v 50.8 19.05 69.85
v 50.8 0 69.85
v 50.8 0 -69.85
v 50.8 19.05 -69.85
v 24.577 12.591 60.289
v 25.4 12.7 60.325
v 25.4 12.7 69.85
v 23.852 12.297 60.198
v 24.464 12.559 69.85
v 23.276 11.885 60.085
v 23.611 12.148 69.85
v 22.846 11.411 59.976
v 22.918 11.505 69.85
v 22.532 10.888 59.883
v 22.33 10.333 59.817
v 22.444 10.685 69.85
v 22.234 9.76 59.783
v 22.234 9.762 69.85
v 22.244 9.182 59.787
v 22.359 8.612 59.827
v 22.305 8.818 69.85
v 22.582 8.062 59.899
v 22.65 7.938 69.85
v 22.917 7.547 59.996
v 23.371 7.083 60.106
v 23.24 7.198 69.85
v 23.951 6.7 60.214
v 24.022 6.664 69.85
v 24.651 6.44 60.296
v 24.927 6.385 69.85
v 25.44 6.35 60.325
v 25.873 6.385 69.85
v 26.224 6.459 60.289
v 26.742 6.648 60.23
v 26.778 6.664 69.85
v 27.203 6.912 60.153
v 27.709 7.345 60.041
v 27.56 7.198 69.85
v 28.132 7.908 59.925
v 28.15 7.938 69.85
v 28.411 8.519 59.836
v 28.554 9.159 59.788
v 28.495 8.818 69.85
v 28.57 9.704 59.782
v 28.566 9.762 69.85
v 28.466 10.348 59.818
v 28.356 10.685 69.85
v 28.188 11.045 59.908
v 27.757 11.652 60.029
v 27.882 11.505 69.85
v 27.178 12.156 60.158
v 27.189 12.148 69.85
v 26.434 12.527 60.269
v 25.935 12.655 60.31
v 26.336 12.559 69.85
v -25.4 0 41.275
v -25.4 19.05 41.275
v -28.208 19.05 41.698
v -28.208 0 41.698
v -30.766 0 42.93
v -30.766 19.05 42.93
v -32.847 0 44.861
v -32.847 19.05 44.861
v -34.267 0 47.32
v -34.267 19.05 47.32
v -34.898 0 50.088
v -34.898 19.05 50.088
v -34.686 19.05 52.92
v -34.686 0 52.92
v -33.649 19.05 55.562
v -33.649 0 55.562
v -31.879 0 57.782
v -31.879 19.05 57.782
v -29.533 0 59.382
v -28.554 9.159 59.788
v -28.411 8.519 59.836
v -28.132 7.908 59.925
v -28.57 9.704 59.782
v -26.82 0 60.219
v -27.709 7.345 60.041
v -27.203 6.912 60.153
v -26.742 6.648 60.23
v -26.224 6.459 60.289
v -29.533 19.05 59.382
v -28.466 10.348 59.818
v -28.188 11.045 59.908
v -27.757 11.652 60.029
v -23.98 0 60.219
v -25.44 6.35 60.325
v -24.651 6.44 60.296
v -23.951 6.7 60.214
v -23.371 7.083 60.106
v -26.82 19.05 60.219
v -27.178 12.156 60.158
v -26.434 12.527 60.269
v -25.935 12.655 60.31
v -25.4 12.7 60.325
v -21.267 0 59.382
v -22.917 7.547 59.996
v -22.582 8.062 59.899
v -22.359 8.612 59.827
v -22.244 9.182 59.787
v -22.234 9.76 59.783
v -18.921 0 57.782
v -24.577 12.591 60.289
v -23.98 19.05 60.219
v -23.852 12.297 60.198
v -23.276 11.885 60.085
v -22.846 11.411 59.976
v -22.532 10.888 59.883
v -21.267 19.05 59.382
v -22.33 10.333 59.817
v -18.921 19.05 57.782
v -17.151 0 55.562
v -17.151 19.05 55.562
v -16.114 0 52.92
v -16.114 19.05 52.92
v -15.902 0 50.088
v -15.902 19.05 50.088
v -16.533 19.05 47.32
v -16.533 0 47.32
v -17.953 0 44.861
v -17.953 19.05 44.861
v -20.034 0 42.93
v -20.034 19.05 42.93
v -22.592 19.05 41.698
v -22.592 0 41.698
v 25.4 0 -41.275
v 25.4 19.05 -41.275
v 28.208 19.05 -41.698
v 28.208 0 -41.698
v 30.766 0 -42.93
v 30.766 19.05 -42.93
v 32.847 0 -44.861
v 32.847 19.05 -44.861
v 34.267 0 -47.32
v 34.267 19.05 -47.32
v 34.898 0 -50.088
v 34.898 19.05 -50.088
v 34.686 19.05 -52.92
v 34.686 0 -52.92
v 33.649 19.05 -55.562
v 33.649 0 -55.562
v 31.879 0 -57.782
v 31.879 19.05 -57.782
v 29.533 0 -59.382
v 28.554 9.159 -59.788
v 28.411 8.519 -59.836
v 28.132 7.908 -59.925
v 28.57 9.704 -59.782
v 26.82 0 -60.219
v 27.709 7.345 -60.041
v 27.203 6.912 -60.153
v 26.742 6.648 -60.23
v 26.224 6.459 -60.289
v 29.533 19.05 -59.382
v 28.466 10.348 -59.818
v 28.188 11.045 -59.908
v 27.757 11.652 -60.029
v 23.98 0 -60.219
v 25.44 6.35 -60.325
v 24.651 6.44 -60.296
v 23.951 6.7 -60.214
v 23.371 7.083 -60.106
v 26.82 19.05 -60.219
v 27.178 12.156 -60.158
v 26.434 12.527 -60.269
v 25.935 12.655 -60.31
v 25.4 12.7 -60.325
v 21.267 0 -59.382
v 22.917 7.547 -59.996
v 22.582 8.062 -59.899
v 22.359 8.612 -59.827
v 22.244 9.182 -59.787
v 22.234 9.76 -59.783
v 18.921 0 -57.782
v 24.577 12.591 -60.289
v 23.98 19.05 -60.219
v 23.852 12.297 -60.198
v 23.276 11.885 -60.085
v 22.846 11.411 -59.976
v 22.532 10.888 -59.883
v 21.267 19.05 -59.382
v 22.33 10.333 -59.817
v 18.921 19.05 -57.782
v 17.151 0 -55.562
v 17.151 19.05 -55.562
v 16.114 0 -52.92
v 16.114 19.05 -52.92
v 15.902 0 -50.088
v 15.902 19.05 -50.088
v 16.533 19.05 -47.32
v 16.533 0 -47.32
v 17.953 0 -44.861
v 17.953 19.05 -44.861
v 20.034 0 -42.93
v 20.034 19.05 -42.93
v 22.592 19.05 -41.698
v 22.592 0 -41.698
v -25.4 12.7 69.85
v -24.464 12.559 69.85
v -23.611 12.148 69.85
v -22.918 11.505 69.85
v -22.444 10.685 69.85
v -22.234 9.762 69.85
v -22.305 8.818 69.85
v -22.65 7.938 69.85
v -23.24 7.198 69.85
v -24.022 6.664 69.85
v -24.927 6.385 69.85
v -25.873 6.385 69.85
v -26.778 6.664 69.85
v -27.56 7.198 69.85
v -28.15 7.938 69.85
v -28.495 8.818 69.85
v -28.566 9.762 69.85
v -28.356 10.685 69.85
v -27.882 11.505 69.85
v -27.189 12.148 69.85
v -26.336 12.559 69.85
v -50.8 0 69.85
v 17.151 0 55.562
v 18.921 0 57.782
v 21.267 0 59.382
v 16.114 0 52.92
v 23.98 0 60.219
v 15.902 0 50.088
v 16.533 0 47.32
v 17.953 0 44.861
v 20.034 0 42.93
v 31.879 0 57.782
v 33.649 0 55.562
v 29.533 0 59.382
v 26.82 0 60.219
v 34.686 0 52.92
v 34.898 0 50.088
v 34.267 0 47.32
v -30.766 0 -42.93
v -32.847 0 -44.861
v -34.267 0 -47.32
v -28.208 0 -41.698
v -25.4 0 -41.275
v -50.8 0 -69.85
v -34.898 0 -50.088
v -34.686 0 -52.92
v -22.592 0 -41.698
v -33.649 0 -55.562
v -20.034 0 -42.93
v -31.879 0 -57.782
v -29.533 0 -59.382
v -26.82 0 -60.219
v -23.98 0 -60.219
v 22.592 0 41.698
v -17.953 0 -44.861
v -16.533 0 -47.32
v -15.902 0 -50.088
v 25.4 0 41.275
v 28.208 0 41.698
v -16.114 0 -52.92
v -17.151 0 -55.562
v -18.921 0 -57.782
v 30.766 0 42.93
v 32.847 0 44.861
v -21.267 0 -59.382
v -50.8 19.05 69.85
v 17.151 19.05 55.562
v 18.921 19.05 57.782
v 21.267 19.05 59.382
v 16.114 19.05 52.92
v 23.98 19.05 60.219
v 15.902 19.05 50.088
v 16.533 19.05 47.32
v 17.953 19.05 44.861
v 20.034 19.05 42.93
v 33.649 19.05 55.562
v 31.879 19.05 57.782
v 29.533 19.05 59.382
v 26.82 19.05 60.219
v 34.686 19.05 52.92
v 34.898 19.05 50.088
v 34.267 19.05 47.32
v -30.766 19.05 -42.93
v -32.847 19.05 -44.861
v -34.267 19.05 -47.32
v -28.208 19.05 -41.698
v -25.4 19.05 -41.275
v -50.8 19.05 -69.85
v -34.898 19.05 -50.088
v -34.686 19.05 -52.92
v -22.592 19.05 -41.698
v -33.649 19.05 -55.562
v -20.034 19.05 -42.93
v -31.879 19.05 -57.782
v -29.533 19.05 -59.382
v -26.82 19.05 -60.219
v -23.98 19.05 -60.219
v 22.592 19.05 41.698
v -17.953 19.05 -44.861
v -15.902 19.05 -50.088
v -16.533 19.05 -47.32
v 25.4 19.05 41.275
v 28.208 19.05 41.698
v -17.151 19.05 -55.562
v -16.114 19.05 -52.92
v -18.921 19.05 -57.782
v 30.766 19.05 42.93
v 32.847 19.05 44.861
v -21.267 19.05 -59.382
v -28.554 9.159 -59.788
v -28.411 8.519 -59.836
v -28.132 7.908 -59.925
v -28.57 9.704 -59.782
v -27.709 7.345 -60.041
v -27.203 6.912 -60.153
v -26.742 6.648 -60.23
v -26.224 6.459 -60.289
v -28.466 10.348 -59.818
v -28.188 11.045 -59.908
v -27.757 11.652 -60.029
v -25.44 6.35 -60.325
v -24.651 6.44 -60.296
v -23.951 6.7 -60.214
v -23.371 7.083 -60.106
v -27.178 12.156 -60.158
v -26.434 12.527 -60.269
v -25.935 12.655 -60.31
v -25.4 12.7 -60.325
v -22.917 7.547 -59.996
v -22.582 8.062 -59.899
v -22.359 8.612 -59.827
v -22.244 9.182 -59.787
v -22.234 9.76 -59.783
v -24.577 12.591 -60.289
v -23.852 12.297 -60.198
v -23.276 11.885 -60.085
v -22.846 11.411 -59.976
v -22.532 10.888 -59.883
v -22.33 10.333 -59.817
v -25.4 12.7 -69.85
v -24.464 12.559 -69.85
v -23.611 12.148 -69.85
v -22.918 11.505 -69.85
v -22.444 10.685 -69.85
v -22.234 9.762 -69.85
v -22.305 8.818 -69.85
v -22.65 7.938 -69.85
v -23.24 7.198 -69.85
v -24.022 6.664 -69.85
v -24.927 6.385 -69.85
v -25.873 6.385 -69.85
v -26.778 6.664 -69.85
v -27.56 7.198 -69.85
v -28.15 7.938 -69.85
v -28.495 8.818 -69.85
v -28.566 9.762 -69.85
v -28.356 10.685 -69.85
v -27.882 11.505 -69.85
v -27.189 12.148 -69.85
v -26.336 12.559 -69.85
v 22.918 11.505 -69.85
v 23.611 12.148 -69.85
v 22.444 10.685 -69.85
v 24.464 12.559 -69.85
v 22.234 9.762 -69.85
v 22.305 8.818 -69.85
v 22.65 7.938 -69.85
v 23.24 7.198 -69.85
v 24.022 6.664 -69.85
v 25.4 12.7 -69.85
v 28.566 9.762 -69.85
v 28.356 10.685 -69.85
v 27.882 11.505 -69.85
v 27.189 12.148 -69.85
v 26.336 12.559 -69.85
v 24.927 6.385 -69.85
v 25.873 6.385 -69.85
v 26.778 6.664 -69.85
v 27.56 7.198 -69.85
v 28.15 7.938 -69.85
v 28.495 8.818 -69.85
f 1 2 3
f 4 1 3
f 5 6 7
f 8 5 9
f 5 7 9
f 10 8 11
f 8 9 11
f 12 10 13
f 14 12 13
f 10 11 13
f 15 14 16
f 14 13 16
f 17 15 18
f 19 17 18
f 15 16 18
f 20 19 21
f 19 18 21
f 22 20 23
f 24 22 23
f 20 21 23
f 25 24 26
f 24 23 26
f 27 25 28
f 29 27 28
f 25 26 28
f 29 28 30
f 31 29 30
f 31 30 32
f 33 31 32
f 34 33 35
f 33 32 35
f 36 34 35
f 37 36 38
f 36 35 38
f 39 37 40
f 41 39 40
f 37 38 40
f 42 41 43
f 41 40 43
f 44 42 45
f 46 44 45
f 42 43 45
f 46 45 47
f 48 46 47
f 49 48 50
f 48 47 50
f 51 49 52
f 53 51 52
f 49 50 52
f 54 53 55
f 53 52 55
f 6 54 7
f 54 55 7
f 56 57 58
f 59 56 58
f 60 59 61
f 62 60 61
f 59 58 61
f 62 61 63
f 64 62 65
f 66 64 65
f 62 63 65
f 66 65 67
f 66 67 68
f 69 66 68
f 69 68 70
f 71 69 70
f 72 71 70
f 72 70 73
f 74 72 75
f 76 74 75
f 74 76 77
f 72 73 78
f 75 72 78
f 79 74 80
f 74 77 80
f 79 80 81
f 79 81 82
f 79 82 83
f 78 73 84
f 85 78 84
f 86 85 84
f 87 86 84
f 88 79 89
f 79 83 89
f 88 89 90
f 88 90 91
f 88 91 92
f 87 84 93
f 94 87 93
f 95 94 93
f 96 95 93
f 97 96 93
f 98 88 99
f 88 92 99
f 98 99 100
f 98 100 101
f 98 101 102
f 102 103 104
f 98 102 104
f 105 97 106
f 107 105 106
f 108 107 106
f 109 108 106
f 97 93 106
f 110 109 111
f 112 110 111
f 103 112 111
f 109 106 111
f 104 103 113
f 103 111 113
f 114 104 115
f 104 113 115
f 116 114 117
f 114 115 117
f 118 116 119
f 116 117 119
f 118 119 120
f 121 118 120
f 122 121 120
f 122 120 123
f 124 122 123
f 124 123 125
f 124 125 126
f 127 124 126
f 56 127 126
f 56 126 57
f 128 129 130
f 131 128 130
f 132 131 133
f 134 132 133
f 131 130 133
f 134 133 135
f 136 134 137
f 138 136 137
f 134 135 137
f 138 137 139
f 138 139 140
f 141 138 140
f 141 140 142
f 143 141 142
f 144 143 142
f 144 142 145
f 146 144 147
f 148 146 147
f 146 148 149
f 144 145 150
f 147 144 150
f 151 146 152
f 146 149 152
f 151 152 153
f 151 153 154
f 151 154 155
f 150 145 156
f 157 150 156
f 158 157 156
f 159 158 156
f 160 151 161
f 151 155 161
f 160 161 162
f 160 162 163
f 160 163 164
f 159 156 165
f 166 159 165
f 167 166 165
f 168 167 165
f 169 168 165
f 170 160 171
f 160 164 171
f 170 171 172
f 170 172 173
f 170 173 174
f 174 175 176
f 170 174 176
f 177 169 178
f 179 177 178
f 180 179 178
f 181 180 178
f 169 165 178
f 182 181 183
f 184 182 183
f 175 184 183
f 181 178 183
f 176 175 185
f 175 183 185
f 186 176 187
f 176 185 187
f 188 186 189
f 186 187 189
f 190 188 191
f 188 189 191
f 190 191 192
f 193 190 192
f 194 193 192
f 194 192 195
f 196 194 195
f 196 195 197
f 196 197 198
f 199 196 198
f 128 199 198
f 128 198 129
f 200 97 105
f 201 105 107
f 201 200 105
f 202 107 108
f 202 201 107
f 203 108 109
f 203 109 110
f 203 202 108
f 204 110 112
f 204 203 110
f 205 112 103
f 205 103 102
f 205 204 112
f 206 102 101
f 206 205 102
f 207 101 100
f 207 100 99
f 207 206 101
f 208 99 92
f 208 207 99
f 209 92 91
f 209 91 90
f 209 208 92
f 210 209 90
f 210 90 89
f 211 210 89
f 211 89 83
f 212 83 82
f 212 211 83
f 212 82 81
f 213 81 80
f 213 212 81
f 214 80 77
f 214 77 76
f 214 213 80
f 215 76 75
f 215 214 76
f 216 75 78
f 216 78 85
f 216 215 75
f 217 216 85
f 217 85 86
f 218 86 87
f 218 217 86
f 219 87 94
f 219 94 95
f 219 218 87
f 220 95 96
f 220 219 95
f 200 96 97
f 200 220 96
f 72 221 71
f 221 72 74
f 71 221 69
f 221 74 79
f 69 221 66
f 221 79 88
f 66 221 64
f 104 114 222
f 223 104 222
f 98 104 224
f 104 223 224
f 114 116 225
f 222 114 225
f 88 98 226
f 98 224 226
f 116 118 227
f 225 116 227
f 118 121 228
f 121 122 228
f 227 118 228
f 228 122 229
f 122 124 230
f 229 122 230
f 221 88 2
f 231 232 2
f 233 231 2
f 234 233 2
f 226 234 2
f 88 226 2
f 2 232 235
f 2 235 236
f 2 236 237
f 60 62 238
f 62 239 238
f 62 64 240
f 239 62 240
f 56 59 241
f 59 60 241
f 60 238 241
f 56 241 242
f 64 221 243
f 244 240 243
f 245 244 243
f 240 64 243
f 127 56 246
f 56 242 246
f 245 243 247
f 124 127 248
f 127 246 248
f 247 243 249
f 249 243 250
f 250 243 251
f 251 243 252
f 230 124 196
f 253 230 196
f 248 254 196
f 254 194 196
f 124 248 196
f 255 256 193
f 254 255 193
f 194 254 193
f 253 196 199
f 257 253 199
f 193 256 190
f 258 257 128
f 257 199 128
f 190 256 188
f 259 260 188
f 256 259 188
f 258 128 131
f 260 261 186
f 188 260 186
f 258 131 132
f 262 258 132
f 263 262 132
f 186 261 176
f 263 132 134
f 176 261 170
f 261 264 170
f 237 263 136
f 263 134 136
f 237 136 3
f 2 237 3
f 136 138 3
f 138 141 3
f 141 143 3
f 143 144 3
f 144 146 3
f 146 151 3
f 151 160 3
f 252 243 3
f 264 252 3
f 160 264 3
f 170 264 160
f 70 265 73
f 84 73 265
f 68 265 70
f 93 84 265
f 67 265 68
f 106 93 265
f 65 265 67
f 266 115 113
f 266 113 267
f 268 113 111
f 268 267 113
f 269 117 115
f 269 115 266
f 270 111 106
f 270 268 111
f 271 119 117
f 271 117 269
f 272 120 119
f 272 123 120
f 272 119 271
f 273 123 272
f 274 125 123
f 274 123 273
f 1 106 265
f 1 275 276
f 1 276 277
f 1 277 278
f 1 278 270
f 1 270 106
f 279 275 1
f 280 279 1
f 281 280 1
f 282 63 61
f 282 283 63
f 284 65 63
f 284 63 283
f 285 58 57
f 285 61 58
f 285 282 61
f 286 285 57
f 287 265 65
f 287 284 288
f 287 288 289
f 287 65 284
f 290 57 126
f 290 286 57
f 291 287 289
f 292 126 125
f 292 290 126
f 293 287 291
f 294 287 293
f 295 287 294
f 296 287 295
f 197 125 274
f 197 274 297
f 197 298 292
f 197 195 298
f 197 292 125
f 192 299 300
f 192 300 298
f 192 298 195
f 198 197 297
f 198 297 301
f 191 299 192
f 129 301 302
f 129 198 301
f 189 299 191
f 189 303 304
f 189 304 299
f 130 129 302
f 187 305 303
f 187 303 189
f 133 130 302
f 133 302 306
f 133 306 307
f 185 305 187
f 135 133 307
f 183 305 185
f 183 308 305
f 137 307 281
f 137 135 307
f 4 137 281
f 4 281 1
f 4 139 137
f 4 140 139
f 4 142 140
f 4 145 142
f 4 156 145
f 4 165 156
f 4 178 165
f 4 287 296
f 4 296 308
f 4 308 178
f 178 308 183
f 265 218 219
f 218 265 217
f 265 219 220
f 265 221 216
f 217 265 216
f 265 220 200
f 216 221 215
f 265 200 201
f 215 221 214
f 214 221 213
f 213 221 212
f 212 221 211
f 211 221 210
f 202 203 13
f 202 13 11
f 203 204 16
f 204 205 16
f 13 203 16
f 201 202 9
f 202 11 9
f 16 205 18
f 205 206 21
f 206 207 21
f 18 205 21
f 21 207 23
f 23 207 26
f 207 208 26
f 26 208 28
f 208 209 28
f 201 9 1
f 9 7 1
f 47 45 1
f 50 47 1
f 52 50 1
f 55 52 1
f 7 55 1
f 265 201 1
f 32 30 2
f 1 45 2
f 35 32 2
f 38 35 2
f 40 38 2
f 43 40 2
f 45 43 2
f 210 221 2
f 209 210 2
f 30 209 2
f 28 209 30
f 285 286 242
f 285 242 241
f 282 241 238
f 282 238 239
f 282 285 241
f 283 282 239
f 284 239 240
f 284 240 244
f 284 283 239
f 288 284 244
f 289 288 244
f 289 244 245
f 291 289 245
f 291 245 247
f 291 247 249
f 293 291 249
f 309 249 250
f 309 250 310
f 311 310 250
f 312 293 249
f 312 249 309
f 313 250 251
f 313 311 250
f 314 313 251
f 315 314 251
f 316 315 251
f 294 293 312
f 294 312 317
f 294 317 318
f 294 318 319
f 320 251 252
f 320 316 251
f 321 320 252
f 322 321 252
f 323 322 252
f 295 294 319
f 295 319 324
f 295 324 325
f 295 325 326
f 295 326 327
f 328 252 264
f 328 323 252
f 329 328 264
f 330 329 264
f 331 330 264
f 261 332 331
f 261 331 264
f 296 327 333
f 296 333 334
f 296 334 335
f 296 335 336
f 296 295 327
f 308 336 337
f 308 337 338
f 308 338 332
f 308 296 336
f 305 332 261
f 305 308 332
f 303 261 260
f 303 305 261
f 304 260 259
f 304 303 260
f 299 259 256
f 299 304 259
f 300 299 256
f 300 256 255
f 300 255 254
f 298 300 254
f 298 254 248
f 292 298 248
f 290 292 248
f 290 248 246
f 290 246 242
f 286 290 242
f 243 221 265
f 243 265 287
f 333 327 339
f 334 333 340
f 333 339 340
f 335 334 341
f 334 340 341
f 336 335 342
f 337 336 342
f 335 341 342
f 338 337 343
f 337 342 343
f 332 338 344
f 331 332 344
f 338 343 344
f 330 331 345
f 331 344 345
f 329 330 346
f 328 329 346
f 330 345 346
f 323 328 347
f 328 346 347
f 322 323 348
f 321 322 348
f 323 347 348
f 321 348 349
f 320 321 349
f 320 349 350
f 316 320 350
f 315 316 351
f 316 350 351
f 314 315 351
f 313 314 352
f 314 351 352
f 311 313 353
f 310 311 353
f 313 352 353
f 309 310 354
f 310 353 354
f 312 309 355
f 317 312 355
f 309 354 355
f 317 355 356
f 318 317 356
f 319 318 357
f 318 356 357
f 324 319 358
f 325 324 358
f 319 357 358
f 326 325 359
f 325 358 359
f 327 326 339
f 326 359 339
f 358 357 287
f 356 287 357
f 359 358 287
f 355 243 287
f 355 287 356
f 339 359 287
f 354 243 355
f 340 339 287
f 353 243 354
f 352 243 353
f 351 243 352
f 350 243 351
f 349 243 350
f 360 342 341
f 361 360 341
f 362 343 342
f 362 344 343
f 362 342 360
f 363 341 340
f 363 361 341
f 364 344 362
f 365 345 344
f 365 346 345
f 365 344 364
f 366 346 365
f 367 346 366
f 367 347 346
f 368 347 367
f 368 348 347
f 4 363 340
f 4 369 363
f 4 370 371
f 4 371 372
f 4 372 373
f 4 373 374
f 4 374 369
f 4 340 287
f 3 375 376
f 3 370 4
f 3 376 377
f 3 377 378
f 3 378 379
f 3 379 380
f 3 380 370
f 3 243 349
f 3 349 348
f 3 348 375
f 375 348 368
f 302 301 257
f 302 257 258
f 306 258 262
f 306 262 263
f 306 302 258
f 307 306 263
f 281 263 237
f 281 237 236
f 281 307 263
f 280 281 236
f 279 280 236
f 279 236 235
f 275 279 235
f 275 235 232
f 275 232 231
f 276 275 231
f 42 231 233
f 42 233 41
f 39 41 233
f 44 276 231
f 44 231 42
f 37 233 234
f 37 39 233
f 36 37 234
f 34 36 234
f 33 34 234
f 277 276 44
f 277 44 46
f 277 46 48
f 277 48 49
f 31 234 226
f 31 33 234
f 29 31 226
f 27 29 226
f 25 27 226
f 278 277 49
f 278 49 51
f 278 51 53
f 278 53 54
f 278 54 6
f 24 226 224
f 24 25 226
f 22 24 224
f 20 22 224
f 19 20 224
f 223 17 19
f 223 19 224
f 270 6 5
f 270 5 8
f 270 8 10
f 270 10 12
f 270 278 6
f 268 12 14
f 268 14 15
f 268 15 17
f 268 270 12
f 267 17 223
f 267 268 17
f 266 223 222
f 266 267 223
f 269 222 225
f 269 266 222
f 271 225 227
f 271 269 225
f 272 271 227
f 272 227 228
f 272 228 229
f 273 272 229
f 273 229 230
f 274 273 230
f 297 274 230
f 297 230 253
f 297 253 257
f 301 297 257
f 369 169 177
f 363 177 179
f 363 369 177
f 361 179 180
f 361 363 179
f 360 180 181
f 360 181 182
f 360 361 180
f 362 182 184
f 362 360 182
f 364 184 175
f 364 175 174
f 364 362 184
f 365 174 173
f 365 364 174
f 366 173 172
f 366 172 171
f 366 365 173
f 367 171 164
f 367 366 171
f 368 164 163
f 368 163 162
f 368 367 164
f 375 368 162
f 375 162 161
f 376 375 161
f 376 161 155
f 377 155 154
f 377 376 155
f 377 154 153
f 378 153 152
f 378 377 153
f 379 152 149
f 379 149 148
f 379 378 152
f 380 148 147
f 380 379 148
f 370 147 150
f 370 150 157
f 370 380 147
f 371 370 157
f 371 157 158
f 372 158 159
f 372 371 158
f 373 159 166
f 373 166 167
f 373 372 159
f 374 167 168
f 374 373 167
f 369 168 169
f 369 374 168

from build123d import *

# Parameters (mm, degrees)
SKETCH1_W           = 101.6
SKETCH1_H           = 139.7
BOSS_EXTRUDE1_DEPTH = 19.05


with BuildPart() as part:
    # Sketch1 → Boss-Extrude1 (new body)
    with BuildSketch(Plane(origin=(0, 0, 0), x_dir=(1, 0, 0), z_dir=(0, 1, 0))):
        Rectangle(SKETCH1_W, SKETCH1_H)
    extrude(amount=BOSS_EXTRUDE1_DEPTH)

    # Sketch2 → 3/4 (0.75) Diameter Hole1 (revolve, cut)
    with BuildSketch(Plane(origin=(-25.4, 19.05, -50.8), x_dir=(0, 0, 1), z_dir=(1, 0, 0))):
        Polygon((0, 0), (0, 24.773197396), (9.525, 19.05), (9.525, 0), align=None)
    f_3_4_0_75_diameter_hole1 = revolve(axis=Axis((-25.4, 25.4, -50.8), (0, -1, 0)), mode=Mode.SUBTRACT)

    # Mirror1: 3/4 (0.75) Diameter Hole1 across plane
    add(f_3_4_0_75_diameter_hole1.mirror(Plane.XY), mode=Mode.SUBTRACT)

    # Mirror4: 3/4 (0.75) Diameter Hole1 across plane
    add(f_3_4_0_75_diameter_hole1.mirror(Plane(origin=(0, 0, 0), x_dir=(0, 0, 1), z_dir=(1, 0, 0))), mode=Mode.SUBTRACT)

    # Mirror4 copy 1 sketch → Mirror4 copy 1 (revolve, cut)
    with BuildSketch(Plane(origin=(25.4, 19.05, 50.8), x_dir=(0, 0, -1), z_dir=(-1, 0, 0))):
        Polygon((0, 0), (0, 24.773197396), (9.525, 19.05), (9.525, 0), align=None)
    revolve(axis=Axis((25.4, 25.4, 50.8), (0, -1, 0)), mode=Mode.SUBTRACT)

    # Sketch4 → 1/4 (0.25) Diameter Hole1 (revolve, cut)
    with BuildSketch(Plane(origin=(25.4, 9.525, -69.85), x_dir=(0, 1, 0), z_dir=(1, 0, 0))):
        Polygon((0, 0), (0, 20.957732465), (3.175, 19.05), (3.175, 0), align=None)
    f_1_4_0_25_diameter_hole1 = revolve(axis=Axis((25.4, 9.525, -76.2), (0, 0, 1)), mode=Mode.SUBTRACT)

    # Mirror5: 1/4 (0.25) Diameter Hole1 across plane
    add(f_1_4_0_25_diameter_hole1.mirror(Plane.XY), mode=Mode.SUBTRACT)

    # Mirror10: 1/4 (0.25) Diameter Hole1 across plane
    add(f_1_4_0_25_diameter_hole1.mirror(Plane(origin=(0, 0, 0), x_dir=(0, 0, 1), z_dir=(1, 0, 0))), mode=Mode.SUBTRACT)

    # Mirror10 copy 1 sketch → Mirror10 copy 1 (revolve, cut)
    with BuildSketch(Plane(origin=(-25.4, 9.525, 69.85), x_dir=(0, 1, 0), z_dir=(-1, 0, 0))):
        Polygon((0, 0), (0, 20.957732465), (3.175, 19.05), (3.175, 0), align=None)
    revolve(axis=Axis((-25.4, 9.525, 76.2), (0, 0, -1)), mode=Mode.SUBTRACT)


solid = part.part
